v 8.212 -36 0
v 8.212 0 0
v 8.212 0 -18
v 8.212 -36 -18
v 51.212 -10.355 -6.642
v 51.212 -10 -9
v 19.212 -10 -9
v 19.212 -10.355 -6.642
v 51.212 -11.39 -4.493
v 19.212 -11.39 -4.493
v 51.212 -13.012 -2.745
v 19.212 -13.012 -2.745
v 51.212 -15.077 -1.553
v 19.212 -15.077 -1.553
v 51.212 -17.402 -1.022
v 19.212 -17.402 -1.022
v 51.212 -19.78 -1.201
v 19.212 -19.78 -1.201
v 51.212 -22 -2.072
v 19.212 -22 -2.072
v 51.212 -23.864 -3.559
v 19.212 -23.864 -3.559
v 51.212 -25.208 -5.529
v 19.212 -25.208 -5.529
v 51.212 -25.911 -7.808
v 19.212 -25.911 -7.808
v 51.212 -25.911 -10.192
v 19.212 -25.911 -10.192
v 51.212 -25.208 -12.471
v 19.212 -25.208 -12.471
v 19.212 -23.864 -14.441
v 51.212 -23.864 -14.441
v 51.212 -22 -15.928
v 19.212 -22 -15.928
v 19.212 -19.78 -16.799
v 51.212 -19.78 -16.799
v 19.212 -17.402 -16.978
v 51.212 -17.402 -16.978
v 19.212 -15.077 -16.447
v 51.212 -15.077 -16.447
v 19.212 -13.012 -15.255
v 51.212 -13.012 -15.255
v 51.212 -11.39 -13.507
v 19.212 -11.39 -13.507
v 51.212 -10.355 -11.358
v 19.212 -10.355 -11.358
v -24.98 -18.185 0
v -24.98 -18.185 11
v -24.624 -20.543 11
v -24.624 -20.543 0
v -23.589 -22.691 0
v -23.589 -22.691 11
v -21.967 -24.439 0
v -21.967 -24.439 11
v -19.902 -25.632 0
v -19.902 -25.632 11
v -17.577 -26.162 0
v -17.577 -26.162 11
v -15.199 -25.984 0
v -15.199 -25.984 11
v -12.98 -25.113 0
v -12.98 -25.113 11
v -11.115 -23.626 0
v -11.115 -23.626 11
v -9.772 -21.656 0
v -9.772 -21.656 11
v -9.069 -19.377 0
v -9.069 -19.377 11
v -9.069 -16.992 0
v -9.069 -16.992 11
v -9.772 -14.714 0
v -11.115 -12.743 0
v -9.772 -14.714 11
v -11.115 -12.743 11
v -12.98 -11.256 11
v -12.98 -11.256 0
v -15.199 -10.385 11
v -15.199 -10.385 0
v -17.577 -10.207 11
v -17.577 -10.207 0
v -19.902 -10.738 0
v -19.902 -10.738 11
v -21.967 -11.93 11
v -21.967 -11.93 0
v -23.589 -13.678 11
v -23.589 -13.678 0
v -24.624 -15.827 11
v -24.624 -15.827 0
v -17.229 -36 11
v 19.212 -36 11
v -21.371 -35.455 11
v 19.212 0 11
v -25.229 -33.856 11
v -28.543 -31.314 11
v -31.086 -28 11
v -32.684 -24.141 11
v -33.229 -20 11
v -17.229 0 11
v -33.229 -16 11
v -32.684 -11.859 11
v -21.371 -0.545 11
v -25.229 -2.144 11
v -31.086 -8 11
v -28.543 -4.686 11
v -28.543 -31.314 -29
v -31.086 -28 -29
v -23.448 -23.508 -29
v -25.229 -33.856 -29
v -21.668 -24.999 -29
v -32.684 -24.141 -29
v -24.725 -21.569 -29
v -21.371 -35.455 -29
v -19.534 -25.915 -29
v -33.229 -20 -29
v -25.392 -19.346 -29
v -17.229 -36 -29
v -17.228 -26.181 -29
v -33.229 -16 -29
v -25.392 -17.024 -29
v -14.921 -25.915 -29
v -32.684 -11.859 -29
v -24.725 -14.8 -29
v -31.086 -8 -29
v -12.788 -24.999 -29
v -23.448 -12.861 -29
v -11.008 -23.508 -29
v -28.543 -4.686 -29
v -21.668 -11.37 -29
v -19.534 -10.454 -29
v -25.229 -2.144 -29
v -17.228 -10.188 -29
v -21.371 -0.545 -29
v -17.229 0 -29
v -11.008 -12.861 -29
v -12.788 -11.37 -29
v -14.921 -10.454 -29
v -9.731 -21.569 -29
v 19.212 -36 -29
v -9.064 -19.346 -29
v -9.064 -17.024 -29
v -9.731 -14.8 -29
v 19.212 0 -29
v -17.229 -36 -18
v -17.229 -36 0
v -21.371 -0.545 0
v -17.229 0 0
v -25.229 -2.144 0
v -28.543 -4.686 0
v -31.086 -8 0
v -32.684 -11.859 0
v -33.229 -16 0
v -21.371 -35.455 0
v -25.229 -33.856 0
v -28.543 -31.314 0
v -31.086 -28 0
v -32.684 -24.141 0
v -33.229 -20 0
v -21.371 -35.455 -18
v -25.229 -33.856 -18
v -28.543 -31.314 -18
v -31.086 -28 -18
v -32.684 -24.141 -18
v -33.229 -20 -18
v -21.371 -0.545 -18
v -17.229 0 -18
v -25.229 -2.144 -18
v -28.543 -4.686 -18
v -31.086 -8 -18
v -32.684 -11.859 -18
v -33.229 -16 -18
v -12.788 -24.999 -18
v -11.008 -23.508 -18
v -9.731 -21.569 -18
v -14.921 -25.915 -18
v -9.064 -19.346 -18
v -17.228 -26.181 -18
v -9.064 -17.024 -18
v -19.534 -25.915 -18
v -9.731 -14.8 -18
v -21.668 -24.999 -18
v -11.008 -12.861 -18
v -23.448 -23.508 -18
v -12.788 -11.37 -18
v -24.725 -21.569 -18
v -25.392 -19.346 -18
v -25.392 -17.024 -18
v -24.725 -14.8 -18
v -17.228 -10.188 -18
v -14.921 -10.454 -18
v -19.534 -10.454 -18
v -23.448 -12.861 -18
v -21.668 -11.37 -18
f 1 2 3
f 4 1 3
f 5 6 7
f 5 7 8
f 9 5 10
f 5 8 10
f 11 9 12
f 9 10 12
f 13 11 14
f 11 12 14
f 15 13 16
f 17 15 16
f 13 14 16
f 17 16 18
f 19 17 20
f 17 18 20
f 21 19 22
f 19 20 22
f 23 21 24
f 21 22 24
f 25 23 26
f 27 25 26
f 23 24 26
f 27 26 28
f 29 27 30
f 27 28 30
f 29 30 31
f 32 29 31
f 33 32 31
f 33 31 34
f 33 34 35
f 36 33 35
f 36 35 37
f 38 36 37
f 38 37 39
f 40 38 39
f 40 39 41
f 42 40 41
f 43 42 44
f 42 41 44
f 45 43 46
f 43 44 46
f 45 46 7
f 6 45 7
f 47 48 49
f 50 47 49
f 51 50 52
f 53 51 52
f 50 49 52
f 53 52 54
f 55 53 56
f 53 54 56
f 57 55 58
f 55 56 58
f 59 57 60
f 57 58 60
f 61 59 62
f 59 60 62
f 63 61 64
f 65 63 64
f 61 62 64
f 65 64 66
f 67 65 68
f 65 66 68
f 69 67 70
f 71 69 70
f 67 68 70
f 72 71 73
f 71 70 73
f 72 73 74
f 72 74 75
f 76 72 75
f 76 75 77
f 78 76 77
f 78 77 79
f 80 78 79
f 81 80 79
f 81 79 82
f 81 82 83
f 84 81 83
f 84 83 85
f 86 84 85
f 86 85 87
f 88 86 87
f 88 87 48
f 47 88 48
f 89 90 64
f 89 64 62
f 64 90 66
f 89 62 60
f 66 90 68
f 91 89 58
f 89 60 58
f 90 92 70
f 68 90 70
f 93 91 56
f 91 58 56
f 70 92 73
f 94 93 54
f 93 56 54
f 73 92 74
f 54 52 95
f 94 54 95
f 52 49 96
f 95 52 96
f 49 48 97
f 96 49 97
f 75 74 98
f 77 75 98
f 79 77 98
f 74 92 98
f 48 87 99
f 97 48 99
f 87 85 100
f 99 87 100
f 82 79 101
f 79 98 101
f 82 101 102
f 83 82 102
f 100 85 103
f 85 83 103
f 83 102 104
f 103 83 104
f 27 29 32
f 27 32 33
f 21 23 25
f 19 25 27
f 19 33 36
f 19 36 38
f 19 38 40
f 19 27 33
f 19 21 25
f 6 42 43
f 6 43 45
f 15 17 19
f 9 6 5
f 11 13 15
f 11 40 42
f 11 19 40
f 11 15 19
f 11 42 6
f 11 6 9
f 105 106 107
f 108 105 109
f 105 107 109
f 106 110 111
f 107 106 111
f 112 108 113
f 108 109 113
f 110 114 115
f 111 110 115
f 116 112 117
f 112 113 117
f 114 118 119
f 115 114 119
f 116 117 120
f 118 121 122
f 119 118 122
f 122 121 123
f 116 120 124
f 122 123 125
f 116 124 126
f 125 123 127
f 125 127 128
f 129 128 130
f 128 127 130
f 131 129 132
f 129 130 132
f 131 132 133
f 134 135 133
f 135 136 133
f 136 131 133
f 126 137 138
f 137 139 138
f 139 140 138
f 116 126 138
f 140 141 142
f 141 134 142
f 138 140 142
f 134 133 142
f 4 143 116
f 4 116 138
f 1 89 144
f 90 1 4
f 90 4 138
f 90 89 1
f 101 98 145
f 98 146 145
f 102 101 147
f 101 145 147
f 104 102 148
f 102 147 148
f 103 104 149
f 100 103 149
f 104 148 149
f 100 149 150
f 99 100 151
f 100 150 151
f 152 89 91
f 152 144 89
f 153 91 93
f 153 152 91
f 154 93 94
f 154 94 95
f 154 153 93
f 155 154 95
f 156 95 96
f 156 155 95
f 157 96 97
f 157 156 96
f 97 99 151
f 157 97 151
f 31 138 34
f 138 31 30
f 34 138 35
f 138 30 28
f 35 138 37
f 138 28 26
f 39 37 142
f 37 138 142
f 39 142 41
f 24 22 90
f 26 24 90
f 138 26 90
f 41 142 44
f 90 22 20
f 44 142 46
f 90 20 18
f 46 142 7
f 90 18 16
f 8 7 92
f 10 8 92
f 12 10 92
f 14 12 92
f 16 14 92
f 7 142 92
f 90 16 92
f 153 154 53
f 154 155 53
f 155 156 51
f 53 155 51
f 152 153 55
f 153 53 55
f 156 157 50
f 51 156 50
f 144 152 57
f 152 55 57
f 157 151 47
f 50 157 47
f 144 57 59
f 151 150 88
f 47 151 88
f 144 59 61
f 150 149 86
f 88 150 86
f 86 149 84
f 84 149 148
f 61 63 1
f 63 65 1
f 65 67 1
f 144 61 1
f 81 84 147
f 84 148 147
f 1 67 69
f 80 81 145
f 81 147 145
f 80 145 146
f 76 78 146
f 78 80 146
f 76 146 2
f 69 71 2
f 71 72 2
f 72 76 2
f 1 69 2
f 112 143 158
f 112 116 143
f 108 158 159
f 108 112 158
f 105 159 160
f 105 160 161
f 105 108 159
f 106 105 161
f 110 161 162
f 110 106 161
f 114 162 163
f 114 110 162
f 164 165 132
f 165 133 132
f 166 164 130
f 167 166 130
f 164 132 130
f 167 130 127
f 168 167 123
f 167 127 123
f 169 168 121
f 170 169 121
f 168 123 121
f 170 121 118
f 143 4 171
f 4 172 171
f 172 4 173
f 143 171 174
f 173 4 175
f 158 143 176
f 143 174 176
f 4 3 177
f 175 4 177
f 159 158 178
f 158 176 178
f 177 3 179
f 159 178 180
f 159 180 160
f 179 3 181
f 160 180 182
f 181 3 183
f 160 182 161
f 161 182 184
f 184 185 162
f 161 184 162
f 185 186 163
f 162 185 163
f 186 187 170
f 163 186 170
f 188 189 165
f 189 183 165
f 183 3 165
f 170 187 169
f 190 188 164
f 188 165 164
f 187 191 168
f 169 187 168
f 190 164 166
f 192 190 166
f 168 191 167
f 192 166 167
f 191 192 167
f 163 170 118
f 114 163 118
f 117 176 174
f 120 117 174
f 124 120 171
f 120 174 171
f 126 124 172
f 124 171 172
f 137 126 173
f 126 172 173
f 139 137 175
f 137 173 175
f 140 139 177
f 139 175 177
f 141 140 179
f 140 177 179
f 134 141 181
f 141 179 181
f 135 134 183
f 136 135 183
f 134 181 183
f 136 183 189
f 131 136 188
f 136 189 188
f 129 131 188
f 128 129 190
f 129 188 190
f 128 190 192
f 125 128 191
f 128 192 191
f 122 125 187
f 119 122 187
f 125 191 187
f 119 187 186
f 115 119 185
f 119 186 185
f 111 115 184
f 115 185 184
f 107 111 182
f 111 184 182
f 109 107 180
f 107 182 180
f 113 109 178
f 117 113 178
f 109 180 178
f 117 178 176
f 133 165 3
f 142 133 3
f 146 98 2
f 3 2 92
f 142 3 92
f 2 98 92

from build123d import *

# Parameters (mm, degrees)
F1_DEPTH = 36
F2_R     = 8
F3_DEPTH = 32
F4_R     = 8
F5_DEPTH = 29.001
F6_R     = 8
F7_DEPTH = 29.001
F8_D     = 16
F9_R     = 16


with BuildPart() as f1:
    # F0 (on Front) → F1 (new body)
    with BuildSketch(Plane.XZ):
        Polygon((19.2118563248, 11), (-33.2294469934, 11), (-33.2294469934, 0), (8.2118563248, 0), (8.2118563248, -18), (-33.2294469934, -18), (-33.2294469934, -29), (19.2118563248, -29), (19.2118563248, -18), (19.2118563248, 0), align=None)
    extrude(amount=F1_DEPTH)

    # F2 (on face) → F3 (join)
    with BuildSketch(Plane.YZ.offset(19.2118563248)):
        with Locations((-18, -9)):
            Circle(F2_R)
    extrude(amount=F3_DEPTH)

    # F4 (on Top) → F5 (cut, through all)
    with BuildSketch(Plane.XY):
        with Locations((-16.9795084218, -18.1846376508)):
            Circle(F4_R)
    extrude(amount=-F5_DEPTH, mode=Mode.SUBTRACT)

    # F6 (on Top) → F7 (cut, through all)
    with BuildSketch(Plane.XY):
        with Locations((-17.4762796468, -18.1846376508)):
            Circle(F6_R)
    extrude(amount=-F7_DEPTH, mode=Mode.SUBTRACT)

    # F8 (through all)
    with Locations(Plane(origin=(0, 0, 0), x_dir=(1, 0, 0), z_dir=(0, 0, -1))):
        with Locations((-16.9795084218, 18.1846376508)):
            Hole(F8_D / 2)

    # F9
    f9_edges = [f1.edges().sort_by_distance(p)[0] for p in [
        (-33.229447, 0, -23.5),
        (-33.229447, 0, 5.5),
        (-33.229447, -36, 5.5),
        (-33.229447, -36, -23.5),
    ]]
    fillet(f9_edges, radius=F9_R)


solid = f1.part
